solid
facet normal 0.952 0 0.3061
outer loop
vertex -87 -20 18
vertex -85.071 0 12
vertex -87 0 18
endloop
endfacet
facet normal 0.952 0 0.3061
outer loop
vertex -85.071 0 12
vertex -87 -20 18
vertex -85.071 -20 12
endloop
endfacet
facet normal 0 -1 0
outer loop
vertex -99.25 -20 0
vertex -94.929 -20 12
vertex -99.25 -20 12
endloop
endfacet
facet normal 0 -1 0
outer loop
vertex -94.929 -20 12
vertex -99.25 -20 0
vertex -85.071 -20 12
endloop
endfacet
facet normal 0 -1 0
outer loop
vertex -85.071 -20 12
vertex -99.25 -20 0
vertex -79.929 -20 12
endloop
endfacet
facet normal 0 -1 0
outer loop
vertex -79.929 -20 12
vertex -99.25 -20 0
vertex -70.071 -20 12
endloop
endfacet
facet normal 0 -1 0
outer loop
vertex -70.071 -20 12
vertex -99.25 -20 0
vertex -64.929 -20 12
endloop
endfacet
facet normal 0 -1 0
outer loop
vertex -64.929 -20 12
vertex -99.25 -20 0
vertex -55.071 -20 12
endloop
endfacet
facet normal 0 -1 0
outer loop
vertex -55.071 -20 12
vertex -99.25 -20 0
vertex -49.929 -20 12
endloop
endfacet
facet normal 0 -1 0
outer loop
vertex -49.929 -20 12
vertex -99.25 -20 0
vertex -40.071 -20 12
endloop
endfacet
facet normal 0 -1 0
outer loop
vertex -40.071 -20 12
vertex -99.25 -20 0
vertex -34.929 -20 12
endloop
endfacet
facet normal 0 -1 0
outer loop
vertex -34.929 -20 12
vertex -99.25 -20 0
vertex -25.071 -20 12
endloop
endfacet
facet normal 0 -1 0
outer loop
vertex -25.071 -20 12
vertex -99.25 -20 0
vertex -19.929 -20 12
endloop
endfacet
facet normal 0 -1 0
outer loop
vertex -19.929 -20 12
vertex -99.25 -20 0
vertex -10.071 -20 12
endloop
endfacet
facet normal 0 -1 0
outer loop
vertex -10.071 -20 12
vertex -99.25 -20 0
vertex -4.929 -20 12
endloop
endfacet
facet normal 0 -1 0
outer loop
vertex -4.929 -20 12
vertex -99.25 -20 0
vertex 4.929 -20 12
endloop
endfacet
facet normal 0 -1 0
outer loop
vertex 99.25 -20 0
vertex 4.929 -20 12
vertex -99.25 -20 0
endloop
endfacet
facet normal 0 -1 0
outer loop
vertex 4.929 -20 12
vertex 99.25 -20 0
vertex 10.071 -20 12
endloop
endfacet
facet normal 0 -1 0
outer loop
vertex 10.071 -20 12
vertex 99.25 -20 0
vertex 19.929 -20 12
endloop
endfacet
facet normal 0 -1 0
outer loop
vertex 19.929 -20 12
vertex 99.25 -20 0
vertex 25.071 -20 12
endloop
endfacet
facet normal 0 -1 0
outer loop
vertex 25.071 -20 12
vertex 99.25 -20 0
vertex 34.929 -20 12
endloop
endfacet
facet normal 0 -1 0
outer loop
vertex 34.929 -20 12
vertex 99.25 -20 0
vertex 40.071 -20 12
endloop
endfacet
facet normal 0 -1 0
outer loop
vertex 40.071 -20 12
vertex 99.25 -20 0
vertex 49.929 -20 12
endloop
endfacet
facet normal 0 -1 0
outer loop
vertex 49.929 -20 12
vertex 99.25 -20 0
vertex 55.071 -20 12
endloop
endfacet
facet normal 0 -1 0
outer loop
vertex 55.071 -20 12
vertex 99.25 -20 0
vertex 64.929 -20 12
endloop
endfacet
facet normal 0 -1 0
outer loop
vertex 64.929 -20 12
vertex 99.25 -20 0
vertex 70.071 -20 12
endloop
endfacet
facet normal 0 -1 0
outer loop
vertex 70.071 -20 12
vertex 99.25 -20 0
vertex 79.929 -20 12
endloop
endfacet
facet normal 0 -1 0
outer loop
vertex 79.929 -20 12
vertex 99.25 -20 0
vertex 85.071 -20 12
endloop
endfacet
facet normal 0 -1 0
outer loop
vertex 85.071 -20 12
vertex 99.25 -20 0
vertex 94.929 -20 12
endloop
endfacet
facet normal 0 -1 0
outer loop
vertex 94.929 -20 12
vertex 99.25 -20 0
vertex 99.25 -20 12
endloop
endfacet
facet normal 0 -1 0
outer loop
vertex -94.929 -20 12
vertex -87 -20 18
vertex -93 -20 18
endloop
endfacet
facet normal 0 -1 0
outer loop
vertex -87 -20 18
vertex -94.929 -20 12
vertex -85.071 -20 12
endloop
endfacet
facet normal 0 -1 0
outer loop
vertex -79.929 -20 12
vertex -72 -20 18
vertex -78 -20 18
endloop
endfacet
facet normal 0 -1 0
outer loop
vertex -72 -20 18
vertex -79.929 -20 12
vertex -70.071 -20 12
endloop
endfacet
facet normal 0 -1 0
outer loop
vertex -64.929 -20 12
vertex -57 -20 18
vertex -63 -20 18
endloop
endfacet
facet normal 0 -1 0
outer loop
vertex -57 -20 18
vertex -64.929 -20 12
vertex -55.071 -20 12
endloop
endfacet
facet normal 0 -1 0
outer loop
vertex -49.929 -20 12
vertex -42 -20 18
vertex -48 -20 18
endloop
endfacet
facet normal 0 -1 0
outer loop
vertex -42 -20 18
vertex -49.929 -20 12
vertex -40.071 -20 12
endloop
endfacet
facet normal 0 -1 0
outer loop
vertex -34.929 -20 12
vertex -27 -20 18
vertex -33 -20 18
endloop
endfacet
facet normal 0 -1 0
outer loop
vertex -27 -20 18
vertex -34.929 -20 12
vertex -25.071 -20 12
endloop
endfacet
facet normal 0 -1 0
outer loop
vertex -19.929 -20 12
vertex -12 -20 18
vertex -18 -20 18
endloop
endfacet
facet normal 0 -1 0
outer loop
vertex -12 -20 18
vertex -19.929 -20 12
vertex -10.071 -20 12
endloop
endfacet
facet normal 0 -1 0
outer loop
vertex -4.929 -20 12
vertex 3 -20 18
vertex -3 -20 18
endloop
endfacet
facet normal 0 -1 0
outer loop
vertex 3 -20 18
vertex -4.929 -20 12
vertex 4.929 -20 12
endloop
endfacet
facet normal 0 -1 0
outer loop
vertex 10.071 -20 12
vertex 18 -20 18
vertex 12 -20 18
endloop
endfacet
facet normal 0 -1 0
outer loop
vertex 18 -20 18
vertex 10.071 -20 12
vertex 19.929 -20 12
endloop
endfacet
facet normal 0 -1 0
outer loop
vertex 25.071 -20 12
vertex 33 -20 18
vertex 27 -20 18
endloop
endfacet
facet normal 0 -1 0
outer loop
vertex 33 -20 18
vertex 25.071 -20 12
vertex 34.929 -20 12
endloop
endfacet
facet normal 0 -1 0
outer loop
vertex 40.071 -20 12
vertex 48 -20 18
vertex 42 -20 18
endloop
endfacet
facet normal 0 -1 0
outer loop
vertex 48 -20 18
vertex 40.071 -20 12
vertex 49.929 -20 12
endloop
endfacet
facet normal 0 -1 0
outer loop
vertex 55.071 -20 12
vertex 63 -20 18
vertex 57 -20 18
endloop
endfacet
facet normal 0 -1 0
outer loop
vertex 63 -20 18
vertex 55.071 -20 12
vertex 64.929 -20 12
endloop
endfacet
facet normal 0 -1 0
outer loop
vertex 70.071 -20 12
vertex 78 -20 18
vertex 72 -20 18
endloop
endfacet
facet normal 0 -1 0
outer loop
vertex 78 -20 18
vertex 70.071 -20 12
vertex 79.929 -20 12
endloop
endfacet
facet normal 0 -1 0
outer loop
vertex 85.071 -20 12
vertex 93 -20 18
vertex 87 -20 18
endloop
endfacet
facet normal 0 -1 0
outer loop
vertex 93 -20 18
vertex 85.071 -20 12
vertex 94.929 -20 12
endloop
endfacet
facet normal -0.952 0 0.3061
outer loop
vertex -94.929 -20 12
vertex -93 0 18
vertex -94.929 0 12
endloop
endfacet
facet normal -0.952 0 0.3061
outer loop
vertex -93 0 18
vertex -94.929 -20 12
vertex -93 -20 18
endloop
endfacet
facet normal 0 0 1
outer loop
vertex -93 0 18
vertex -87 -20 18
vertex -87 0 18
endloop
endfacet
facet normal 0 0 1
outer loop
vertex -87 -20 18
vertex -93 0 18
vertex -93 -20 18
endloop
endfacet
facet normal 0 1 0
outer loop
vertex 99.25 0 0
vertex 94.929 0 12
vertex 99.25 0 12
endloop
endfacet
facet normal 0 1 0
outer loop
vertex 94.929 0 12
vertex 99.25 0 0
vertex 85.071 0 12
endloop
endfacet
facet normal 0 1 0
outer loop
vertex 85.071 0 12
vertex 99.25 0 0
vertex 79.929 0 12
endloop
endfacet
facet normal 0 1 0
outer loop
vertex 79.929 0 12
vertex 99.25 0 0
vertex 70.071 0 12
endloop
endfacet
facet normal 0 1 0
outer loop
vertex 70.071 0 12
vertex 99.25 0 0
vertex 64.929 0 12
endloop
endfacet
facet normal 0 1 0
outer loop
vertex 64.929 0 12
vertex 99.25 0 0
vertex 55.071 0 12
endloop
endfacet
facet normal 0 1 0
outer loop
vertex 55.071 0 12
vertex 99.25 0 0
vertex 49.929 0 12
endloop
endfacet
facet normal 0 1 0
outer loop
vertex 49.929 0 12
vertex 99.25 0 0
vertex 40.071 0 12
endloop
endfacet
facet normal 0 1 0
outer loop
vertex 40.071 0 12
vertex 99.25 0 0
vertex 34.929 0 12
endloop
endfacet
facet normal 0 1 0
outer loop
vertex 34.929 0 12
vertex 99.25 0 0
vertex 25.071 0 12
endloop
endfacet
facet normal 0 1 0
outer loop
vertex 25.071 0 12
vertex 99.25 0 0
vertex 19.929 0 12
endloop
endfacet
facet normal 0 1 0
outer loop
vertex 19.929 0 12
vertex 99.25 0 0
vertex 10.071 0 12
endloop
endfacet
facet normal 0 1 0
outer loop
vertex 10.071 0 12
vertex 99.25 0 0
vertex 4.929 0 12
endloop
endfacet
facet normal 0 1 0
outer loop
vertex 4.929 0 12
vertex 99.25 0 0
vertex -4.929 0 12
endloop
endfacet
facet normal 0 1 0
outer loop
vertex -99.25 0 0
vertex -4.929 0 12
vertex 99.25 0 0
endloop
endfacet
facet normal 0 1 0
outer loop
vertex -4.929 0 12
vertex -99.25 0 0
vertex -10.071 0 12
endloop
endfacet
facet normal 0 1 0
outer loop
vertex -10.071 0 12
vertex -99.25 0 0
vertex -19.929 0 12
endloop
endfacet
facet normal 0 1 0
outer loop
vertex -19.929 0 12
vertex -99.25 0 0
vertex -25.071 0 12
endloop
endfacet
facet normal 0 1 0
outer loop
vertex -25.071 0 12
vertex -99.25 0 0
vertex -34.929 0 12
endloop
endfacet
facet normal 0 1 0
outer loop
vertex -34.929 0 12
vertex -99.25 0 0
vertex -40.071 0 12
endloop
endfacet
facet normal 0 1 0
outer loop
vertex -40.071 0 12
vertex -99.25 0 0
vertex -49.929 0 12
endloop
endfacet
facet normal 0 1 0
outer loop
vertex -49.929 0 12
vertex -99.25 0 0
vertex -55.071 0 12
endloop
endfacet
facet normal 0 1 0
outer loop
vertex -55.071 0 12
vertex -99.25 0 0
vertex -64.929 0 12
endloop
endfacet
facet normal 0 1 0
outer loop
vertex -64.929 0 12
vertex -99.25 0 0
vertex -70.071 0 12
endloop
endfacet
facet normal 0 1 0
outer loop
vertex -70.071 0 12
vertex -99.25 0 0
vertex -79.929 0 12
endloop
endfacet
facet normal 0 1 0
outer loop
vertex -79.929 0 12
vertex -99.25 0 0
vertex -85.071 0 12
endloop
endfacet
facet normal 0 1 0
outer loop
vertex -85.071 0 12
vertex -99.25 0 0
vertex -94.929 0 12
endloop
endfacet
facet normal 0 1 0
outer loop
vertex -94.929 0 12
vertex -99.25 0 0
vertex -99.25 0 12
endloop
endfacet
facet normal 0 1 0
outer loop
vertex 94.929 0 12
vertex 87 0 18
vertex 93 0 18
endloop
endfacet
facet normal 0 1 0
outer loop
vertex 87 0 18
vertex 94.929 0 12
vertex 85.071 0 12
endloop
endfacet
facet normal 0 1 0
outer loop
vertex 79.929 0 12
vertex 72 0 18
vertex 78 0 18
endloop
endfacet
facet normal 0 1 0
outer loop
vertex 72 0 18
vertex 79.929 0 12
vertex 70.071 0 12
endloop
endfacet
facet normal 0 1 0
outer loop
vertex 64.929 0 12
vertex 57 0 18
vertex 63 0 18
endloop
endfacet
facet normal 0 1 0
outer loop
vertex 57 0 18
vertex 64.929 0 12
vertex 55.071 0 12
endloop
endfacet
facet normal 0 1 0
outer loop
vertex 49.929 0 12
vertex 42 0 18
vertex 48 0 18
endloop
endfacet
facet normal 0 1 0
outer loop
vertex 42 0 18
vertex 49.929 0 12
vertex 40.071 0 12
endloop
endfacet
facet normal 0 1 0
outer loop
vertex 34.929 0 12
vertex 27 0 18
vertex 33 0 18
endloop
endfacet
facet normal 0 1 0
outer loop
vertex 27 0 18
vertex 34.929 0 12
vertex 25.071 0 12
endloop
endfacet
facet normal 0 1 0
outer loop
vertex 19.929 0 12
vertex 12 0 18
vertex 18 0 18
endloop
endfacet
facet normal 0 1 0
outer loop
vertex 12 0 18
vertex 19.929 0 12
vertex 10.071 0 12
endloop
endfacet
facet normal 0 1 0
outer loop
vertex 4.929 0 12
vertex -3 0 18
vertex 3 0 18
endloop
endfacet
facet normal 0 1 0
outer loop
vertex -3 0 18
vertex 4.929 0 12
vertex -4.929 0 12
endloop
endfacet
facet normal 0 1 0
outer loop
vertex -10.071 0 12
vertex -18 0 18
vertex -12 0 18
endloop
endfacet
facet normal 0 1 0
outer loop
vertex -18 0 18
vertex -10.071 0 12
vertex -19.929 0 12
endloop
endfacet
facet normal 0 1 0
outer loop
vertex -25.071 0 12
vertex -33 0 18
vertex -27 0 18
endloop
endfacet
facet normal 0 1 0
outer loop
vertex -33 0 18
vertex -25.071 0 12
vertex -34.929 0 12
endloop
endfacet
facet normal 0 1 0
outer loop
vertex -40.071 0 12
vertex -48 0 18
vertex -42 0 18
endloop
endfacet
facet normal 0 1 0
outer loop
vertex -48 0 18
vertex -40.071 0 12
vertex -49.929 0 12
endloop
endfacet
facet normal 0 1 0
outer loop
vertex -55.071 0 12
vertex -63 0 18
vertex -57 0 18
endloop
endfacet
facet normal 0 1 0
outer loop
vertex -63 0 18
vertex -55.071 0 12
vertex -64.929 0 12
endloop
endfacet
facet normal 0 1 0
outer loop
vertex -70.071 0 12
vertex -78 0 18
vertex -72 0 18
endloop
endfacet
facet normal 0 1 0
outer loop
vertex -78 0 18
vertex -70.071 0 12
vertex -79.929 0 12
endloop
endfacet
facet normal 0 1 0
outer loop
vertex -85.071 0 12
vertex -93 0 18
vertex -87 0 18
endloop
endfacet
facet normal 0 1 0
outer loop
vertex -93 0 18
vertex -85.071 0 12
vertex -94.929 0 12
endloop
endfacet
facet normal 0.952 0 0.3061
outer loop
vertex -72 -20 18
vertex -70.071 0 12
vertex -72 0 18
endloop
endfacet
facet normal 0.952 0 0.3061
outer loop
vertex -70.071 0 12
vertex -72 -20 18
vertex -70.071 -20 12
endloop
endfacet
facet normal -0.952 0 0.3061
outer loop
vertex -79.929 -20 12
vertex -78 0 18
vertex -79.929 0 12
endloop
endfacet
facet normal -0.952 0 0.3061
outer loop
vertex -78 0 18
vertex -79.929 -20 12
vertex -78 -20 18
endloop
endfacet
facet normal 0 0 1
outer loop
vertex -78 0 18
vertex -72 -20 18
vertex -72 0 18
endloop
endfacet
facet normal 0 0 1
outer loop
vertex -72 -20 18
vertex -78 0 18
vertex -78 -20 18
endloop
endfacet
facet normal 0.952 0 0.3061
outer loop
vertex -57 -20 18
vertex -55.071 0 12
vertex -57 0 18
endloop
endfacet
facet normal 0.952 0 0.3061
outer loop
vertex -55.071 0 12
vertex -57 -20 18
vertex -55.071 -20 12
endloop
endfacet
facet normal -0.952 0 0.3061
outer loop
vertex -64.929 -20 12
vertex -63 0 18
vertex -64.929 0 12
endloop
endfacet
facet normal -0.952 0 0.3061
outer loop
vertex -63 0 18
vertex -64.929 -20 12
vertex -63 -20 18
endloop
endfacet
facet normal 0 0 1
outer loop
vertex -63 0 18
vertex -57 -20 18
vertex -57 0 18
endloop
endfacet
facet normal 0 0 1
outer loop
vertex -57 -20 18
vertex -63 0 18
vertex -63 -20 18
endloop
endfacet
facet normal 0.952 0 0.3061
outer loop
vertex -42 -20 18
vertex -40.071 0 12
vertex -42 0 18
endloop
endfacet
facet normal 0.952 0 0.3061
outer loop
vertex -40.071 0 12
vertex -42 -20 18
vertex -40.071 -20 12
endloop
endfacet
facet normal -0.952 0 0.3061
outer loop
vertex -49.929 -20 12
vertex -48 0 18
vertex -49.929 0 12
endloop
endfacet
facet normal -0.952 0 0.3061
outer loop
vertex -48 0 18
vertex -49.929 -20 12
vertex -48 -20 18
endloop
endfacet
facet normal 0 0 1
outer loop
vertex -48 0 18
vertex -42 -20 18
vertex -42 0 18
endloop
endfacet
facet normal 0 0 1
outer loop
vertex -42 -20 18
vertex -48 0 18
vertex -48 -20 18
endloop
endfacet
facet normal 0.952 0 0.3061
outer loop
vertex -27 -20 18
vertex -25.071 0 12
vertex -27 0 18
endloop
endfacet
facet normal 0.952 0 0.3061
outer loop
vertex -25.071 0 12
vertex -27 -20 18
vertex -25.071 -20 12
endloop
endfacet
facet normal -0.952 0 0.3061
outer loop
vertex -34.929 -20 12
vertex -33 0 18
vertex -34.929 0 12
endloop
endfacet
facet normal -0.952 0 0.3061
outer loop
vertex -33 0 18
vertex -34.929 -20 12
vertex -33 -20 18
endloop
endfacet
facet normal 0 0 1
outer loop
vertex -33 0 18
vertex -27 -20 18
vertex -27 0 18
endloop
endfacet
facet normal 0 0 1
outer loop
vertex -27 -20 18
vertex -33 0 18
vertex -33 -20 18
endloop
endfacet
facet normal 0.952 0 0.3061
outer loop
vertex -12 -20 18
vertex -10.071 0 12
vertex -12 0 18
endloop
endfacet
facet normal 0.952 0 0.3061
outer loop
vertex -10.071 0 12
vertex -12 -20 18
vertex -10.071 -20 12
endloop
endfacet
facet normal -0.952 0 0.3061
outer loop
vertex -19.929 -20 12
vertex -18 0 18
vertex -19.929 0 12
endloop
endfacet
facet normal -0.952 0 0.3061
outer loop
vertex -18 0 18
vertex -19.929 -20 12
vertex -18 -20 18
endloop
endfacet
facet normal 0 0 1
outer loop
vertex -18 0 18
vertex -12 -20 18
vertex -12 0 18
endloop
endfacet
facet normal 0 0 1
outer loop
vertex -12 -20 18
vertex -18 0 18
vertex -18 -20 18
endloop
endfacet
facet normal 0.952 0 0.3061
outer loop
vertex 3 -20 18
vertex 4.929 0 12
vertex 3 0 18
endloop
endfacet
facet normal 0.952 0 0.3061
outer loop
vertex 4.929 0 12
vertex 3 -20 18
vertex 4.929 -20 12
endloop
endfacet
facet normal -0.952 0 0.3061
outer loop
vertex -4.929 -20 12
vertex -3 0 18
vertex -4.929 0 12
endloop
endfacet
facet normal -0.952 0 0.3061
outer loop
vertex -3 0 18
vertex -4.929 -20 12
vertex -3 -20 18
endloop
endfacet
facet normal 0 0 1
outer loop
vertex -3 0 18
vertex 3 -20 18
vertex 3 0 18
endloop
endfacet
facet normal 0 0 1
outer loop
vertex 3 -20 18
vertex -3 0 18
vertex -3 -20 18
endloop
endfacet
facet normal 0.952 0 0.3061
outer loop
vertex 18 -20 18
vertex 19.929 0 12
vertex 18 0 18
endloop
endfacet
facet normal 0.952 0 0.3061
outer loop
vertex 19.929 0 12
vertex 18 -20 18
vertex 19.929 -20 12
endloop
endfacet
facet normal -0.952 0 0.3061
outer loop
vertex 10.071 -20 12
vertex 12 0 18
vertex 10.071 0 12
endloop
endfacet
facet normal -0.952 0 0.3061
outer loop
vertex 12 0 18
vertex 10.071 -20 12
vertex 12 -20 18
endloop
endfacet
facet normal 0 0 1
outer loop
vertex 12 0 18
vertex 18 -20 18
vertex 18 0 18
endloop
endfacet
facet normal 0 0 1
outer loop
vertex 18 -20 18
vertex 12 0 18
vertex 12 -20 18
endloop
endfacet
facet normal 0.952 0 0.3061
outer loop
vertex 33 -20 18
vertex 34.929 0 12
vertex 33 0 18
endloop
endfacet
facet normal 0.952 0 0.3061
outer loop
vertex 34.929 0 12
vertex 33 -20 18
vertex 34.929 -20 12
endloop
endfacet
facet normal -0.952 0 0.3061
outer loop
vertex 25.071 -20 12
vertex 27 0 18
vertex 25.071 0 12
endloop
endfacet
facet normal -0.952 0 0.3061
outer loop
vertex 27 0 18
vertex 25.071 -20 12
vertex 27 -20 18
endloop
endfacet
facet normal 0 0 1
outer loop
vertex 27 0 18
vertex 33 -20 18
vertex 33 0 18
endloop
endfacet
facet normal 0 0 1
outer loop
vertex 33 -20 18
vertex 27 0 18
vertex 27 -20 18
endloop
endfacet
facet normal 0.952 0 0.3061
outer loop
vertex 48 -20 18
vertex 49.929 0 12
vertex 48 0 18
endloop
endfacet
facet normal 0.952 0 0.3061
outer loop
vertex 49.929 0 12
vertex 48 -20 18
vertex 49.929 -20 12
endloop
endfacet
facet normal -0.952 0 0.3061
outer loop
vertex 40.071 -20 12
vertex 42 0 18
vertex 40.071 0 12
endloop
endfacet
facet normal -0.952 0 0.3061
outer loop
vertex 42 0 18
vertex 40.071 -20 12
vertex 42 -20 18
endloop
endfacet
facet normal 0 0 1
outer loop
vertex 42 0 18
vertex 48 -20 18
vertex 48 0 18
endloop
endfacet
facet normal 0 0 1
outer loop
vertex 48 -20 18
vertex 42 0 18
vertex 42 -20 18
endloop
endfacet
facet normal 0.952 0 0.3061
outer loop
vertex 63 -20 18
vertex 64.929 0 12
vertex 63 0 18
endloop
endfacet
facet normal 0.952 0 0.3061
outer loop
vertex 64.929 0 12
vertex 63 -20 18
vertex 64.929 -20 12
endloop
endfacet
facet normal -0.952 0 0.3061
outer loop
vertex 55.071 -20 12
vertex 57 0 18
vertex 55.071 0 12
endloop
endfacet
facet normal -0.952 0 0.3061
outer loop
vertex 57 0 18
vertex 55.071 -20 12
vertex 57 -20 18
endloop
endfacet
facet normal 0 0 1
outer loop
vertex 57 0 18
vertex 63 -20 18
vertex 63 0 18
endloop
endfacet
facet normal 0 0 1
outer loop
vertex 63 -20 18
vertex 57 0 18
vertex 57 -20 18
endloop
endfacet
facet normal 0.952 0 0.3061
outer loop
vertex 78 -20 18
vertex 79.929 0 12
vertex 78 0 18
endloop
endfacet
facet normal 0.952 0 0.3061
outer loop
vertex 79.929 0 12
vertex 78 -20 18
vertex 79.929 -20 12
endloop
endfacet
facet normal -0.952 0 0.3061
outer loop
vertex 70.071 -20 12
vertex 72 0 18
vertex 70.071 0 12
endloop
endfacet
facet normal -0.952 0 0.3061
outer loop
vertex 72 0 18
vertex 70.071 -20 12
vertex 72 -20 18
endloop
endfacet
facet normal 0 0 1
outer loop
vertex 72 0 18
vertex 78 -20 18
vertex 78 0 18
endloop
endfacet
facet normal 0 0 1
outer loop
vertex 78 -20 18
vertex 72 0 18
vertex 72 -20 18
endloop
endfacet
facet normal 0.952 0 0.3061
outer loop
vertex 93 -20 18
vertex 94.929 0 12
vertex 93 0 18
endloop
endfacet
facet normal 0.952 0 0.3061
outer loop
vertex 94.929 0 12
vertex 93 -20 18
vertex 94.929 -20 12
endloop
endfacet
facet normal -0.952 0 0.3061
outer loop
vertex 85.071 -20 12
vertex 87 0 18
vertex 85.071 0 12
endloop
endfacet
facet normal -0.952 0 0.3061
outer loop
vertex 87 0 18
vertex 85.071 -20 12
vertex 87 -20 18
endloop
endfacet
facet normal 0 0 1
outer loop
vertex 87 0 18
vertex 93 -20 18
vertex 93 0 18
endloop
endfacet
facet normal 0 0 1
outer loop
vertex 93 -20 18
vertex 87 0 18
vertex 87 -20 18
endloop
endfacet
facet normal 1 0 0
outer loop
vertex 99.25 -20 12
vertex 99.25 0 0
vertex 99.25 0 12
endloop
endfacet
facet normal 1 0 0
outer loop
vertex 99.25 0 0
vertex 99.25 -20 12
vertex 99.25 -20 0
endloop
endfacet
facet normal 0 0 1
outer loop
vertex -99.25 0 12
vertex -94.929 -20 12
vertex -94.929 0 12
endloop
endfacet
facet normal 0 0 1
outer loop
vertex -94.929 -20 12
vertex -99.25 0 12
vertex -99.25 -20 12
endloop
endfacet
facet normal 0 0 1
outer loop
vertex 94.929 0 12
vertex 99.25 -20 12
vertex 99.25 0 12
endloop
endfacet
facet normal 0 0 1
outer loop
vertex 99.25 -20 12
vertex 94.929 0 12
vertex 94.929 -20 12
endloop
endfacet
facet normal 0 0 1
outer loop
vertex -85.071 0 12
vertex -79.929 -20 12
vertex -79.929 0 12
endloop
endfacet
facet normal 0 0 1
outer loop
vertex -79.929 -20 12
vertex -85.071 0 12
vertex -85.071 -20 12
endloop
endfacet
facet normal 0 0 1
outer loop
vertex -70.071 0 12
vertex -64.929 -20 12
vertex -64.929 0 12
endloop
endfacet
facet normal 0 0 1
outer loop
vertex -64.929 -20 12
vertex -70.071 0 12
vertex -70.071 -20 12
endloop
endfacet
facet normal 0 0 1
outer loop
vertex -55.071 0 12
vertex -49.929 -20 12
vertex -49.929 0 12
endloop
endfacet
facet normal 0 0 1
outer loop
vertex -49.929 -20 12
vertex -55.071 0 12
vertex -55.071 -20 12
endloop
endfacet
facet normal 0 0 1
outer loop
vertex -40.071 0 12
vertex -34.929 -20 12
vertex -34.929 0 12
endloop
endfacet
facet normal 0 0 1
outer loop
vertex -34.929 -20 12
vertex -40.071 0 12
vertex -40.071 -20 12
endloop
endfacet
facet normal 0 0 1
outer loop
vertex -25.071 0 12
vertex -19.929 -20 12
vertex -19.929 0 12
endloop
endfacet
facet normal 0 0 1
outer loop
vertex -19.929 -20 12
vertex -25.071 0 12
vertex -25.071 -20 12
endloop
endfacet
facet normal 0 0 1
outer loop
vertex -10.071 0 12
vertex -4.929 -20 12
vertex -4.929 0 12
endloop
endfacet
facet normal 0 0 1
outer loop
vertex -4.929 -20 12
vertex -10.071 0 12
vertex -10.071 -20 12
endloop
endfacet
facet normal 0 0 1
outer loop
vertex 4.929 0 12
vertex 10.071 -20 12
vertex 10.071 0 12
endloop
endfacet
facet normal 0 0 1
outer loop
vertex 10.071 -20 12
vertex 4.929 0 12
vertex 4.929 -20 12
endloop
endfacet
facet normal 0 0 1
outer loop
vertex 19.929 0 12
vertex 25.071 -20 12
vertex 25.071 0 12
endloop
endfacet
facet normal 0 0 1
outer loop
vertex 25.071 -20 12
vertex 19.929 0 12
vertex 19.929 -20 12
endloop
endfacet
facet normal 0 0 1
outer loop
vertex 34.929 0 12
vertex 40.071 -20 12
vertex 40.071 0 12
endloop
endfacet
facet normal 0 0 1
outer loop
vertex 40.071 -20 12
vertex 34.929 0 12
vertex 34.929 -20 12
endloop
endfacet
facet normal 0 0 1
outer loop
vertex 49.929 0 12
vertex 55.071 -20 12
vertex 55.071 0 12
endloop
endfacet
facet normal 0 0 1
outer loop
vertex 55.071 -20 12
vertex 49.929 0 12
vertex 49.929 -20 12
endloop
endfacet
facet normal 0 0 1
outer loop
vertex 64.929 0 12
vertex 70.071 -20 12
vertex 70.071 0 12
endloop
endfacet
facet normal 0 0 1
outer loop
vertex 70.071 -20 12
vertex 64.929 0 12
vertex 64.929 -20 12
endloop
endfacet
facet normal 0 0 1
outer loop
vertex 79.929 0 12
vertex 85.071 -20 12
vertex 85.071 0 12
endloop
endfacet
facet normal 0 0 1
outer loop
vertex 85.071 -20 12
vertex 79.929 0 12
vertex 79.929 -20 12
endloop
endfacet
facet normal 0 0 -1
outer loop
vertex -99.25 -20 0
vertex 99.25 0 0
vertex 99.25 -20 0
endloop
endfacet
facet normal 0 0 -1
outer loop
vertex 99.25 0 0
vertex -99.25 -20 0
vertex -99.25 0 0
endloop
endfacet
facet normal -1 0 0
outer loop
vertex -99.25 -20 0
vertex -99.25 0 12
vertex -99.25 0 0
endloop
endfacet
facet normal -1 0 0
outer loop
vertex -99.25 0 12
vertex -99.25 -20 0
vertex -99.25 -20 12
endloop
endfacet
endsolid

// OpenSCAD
$fn = 32;

// ----------------------------------------------------------------------
// Toothed rack, 13 teeth
// 15 mm pitch, 6 mm teeth
// ----------------------------------------------------------------------

// --- parameters (mm) ---
bar_w = 20;     // bar width (Y)
bar_h = 12;     // bar height (Z)
teeth = 13;     // number of teeth
pitch = 15;     // tooth pitch
tooth_h = 6;    // tooth height above the bar
root_w = 10.5;  // tooth width at the root
crest_w = 6;    // tooth width at the crest

// --- derived feature positions (mm) ---
span = (teeth - 1) * pitch;  // = 180   distance between the outer teeth
bar_l = span + root_w + 8;   // = 198.5   bar length: teeth plus 4 mm at each end
tooth_x = -span / 2;         // = -90   X of the first tooth
height = bar_h + tooth_h;    // = 18   overall height
feature_centers = [
  [tooth_x + 0 * pitch, -bar_w / 2],
  [tooth_x + 1 * pitch, -bar_w / 2],
  [tooth_x + 2 * pitch, -bar_w / 2],
  [tooth_x + 3 * pitch, -bar_w / 2],
  [tooth_x + 4 * pitch, -bar_w / 2],
  [tooth_x + 5 * pitch, -bar_w / 2],
  [tooth_x + 6 * pitch, -bar_w / 2],
  [tooth_x + 7 * pitch, -bar_w / 2],
  [tooth_x + 8 * pitch, -bar_w / 2],
  [tooth_x + 9 * pitch, -bar_w / 2],
  [tooth_x + 10 * pitch, -bar_w / 2],
  [tooth_x + 11 * pitch, -bar_w / 2],
  [tooth_x + 12 * pitch, -bar_w / 2]
];   // tooth centre line, drives the tooth loop

// bar with a rack of teeth, one extruded trapezoium per centre
module rack_tooth() {
  linear_extrude(height = bar_w)
    polygon(points = [
      [0, 0],
      [root_w, 0],
      [root_w / 2 + crest_w / 2, tooth_h + 1],
      [root_w / 2 - crest_w / 2, tooth_h + 1]
    ]);
}

union() {
  translate([-bar_l / 2, -bar_w, 0]) cube([bar_l, bar_w, bar_h]);
  for (centre = feature_centers)
    translate([centre[0] - root_w / 2, 0, bar_h - 1]) rotate([90, 0, 0]) rack_tooth();
}
